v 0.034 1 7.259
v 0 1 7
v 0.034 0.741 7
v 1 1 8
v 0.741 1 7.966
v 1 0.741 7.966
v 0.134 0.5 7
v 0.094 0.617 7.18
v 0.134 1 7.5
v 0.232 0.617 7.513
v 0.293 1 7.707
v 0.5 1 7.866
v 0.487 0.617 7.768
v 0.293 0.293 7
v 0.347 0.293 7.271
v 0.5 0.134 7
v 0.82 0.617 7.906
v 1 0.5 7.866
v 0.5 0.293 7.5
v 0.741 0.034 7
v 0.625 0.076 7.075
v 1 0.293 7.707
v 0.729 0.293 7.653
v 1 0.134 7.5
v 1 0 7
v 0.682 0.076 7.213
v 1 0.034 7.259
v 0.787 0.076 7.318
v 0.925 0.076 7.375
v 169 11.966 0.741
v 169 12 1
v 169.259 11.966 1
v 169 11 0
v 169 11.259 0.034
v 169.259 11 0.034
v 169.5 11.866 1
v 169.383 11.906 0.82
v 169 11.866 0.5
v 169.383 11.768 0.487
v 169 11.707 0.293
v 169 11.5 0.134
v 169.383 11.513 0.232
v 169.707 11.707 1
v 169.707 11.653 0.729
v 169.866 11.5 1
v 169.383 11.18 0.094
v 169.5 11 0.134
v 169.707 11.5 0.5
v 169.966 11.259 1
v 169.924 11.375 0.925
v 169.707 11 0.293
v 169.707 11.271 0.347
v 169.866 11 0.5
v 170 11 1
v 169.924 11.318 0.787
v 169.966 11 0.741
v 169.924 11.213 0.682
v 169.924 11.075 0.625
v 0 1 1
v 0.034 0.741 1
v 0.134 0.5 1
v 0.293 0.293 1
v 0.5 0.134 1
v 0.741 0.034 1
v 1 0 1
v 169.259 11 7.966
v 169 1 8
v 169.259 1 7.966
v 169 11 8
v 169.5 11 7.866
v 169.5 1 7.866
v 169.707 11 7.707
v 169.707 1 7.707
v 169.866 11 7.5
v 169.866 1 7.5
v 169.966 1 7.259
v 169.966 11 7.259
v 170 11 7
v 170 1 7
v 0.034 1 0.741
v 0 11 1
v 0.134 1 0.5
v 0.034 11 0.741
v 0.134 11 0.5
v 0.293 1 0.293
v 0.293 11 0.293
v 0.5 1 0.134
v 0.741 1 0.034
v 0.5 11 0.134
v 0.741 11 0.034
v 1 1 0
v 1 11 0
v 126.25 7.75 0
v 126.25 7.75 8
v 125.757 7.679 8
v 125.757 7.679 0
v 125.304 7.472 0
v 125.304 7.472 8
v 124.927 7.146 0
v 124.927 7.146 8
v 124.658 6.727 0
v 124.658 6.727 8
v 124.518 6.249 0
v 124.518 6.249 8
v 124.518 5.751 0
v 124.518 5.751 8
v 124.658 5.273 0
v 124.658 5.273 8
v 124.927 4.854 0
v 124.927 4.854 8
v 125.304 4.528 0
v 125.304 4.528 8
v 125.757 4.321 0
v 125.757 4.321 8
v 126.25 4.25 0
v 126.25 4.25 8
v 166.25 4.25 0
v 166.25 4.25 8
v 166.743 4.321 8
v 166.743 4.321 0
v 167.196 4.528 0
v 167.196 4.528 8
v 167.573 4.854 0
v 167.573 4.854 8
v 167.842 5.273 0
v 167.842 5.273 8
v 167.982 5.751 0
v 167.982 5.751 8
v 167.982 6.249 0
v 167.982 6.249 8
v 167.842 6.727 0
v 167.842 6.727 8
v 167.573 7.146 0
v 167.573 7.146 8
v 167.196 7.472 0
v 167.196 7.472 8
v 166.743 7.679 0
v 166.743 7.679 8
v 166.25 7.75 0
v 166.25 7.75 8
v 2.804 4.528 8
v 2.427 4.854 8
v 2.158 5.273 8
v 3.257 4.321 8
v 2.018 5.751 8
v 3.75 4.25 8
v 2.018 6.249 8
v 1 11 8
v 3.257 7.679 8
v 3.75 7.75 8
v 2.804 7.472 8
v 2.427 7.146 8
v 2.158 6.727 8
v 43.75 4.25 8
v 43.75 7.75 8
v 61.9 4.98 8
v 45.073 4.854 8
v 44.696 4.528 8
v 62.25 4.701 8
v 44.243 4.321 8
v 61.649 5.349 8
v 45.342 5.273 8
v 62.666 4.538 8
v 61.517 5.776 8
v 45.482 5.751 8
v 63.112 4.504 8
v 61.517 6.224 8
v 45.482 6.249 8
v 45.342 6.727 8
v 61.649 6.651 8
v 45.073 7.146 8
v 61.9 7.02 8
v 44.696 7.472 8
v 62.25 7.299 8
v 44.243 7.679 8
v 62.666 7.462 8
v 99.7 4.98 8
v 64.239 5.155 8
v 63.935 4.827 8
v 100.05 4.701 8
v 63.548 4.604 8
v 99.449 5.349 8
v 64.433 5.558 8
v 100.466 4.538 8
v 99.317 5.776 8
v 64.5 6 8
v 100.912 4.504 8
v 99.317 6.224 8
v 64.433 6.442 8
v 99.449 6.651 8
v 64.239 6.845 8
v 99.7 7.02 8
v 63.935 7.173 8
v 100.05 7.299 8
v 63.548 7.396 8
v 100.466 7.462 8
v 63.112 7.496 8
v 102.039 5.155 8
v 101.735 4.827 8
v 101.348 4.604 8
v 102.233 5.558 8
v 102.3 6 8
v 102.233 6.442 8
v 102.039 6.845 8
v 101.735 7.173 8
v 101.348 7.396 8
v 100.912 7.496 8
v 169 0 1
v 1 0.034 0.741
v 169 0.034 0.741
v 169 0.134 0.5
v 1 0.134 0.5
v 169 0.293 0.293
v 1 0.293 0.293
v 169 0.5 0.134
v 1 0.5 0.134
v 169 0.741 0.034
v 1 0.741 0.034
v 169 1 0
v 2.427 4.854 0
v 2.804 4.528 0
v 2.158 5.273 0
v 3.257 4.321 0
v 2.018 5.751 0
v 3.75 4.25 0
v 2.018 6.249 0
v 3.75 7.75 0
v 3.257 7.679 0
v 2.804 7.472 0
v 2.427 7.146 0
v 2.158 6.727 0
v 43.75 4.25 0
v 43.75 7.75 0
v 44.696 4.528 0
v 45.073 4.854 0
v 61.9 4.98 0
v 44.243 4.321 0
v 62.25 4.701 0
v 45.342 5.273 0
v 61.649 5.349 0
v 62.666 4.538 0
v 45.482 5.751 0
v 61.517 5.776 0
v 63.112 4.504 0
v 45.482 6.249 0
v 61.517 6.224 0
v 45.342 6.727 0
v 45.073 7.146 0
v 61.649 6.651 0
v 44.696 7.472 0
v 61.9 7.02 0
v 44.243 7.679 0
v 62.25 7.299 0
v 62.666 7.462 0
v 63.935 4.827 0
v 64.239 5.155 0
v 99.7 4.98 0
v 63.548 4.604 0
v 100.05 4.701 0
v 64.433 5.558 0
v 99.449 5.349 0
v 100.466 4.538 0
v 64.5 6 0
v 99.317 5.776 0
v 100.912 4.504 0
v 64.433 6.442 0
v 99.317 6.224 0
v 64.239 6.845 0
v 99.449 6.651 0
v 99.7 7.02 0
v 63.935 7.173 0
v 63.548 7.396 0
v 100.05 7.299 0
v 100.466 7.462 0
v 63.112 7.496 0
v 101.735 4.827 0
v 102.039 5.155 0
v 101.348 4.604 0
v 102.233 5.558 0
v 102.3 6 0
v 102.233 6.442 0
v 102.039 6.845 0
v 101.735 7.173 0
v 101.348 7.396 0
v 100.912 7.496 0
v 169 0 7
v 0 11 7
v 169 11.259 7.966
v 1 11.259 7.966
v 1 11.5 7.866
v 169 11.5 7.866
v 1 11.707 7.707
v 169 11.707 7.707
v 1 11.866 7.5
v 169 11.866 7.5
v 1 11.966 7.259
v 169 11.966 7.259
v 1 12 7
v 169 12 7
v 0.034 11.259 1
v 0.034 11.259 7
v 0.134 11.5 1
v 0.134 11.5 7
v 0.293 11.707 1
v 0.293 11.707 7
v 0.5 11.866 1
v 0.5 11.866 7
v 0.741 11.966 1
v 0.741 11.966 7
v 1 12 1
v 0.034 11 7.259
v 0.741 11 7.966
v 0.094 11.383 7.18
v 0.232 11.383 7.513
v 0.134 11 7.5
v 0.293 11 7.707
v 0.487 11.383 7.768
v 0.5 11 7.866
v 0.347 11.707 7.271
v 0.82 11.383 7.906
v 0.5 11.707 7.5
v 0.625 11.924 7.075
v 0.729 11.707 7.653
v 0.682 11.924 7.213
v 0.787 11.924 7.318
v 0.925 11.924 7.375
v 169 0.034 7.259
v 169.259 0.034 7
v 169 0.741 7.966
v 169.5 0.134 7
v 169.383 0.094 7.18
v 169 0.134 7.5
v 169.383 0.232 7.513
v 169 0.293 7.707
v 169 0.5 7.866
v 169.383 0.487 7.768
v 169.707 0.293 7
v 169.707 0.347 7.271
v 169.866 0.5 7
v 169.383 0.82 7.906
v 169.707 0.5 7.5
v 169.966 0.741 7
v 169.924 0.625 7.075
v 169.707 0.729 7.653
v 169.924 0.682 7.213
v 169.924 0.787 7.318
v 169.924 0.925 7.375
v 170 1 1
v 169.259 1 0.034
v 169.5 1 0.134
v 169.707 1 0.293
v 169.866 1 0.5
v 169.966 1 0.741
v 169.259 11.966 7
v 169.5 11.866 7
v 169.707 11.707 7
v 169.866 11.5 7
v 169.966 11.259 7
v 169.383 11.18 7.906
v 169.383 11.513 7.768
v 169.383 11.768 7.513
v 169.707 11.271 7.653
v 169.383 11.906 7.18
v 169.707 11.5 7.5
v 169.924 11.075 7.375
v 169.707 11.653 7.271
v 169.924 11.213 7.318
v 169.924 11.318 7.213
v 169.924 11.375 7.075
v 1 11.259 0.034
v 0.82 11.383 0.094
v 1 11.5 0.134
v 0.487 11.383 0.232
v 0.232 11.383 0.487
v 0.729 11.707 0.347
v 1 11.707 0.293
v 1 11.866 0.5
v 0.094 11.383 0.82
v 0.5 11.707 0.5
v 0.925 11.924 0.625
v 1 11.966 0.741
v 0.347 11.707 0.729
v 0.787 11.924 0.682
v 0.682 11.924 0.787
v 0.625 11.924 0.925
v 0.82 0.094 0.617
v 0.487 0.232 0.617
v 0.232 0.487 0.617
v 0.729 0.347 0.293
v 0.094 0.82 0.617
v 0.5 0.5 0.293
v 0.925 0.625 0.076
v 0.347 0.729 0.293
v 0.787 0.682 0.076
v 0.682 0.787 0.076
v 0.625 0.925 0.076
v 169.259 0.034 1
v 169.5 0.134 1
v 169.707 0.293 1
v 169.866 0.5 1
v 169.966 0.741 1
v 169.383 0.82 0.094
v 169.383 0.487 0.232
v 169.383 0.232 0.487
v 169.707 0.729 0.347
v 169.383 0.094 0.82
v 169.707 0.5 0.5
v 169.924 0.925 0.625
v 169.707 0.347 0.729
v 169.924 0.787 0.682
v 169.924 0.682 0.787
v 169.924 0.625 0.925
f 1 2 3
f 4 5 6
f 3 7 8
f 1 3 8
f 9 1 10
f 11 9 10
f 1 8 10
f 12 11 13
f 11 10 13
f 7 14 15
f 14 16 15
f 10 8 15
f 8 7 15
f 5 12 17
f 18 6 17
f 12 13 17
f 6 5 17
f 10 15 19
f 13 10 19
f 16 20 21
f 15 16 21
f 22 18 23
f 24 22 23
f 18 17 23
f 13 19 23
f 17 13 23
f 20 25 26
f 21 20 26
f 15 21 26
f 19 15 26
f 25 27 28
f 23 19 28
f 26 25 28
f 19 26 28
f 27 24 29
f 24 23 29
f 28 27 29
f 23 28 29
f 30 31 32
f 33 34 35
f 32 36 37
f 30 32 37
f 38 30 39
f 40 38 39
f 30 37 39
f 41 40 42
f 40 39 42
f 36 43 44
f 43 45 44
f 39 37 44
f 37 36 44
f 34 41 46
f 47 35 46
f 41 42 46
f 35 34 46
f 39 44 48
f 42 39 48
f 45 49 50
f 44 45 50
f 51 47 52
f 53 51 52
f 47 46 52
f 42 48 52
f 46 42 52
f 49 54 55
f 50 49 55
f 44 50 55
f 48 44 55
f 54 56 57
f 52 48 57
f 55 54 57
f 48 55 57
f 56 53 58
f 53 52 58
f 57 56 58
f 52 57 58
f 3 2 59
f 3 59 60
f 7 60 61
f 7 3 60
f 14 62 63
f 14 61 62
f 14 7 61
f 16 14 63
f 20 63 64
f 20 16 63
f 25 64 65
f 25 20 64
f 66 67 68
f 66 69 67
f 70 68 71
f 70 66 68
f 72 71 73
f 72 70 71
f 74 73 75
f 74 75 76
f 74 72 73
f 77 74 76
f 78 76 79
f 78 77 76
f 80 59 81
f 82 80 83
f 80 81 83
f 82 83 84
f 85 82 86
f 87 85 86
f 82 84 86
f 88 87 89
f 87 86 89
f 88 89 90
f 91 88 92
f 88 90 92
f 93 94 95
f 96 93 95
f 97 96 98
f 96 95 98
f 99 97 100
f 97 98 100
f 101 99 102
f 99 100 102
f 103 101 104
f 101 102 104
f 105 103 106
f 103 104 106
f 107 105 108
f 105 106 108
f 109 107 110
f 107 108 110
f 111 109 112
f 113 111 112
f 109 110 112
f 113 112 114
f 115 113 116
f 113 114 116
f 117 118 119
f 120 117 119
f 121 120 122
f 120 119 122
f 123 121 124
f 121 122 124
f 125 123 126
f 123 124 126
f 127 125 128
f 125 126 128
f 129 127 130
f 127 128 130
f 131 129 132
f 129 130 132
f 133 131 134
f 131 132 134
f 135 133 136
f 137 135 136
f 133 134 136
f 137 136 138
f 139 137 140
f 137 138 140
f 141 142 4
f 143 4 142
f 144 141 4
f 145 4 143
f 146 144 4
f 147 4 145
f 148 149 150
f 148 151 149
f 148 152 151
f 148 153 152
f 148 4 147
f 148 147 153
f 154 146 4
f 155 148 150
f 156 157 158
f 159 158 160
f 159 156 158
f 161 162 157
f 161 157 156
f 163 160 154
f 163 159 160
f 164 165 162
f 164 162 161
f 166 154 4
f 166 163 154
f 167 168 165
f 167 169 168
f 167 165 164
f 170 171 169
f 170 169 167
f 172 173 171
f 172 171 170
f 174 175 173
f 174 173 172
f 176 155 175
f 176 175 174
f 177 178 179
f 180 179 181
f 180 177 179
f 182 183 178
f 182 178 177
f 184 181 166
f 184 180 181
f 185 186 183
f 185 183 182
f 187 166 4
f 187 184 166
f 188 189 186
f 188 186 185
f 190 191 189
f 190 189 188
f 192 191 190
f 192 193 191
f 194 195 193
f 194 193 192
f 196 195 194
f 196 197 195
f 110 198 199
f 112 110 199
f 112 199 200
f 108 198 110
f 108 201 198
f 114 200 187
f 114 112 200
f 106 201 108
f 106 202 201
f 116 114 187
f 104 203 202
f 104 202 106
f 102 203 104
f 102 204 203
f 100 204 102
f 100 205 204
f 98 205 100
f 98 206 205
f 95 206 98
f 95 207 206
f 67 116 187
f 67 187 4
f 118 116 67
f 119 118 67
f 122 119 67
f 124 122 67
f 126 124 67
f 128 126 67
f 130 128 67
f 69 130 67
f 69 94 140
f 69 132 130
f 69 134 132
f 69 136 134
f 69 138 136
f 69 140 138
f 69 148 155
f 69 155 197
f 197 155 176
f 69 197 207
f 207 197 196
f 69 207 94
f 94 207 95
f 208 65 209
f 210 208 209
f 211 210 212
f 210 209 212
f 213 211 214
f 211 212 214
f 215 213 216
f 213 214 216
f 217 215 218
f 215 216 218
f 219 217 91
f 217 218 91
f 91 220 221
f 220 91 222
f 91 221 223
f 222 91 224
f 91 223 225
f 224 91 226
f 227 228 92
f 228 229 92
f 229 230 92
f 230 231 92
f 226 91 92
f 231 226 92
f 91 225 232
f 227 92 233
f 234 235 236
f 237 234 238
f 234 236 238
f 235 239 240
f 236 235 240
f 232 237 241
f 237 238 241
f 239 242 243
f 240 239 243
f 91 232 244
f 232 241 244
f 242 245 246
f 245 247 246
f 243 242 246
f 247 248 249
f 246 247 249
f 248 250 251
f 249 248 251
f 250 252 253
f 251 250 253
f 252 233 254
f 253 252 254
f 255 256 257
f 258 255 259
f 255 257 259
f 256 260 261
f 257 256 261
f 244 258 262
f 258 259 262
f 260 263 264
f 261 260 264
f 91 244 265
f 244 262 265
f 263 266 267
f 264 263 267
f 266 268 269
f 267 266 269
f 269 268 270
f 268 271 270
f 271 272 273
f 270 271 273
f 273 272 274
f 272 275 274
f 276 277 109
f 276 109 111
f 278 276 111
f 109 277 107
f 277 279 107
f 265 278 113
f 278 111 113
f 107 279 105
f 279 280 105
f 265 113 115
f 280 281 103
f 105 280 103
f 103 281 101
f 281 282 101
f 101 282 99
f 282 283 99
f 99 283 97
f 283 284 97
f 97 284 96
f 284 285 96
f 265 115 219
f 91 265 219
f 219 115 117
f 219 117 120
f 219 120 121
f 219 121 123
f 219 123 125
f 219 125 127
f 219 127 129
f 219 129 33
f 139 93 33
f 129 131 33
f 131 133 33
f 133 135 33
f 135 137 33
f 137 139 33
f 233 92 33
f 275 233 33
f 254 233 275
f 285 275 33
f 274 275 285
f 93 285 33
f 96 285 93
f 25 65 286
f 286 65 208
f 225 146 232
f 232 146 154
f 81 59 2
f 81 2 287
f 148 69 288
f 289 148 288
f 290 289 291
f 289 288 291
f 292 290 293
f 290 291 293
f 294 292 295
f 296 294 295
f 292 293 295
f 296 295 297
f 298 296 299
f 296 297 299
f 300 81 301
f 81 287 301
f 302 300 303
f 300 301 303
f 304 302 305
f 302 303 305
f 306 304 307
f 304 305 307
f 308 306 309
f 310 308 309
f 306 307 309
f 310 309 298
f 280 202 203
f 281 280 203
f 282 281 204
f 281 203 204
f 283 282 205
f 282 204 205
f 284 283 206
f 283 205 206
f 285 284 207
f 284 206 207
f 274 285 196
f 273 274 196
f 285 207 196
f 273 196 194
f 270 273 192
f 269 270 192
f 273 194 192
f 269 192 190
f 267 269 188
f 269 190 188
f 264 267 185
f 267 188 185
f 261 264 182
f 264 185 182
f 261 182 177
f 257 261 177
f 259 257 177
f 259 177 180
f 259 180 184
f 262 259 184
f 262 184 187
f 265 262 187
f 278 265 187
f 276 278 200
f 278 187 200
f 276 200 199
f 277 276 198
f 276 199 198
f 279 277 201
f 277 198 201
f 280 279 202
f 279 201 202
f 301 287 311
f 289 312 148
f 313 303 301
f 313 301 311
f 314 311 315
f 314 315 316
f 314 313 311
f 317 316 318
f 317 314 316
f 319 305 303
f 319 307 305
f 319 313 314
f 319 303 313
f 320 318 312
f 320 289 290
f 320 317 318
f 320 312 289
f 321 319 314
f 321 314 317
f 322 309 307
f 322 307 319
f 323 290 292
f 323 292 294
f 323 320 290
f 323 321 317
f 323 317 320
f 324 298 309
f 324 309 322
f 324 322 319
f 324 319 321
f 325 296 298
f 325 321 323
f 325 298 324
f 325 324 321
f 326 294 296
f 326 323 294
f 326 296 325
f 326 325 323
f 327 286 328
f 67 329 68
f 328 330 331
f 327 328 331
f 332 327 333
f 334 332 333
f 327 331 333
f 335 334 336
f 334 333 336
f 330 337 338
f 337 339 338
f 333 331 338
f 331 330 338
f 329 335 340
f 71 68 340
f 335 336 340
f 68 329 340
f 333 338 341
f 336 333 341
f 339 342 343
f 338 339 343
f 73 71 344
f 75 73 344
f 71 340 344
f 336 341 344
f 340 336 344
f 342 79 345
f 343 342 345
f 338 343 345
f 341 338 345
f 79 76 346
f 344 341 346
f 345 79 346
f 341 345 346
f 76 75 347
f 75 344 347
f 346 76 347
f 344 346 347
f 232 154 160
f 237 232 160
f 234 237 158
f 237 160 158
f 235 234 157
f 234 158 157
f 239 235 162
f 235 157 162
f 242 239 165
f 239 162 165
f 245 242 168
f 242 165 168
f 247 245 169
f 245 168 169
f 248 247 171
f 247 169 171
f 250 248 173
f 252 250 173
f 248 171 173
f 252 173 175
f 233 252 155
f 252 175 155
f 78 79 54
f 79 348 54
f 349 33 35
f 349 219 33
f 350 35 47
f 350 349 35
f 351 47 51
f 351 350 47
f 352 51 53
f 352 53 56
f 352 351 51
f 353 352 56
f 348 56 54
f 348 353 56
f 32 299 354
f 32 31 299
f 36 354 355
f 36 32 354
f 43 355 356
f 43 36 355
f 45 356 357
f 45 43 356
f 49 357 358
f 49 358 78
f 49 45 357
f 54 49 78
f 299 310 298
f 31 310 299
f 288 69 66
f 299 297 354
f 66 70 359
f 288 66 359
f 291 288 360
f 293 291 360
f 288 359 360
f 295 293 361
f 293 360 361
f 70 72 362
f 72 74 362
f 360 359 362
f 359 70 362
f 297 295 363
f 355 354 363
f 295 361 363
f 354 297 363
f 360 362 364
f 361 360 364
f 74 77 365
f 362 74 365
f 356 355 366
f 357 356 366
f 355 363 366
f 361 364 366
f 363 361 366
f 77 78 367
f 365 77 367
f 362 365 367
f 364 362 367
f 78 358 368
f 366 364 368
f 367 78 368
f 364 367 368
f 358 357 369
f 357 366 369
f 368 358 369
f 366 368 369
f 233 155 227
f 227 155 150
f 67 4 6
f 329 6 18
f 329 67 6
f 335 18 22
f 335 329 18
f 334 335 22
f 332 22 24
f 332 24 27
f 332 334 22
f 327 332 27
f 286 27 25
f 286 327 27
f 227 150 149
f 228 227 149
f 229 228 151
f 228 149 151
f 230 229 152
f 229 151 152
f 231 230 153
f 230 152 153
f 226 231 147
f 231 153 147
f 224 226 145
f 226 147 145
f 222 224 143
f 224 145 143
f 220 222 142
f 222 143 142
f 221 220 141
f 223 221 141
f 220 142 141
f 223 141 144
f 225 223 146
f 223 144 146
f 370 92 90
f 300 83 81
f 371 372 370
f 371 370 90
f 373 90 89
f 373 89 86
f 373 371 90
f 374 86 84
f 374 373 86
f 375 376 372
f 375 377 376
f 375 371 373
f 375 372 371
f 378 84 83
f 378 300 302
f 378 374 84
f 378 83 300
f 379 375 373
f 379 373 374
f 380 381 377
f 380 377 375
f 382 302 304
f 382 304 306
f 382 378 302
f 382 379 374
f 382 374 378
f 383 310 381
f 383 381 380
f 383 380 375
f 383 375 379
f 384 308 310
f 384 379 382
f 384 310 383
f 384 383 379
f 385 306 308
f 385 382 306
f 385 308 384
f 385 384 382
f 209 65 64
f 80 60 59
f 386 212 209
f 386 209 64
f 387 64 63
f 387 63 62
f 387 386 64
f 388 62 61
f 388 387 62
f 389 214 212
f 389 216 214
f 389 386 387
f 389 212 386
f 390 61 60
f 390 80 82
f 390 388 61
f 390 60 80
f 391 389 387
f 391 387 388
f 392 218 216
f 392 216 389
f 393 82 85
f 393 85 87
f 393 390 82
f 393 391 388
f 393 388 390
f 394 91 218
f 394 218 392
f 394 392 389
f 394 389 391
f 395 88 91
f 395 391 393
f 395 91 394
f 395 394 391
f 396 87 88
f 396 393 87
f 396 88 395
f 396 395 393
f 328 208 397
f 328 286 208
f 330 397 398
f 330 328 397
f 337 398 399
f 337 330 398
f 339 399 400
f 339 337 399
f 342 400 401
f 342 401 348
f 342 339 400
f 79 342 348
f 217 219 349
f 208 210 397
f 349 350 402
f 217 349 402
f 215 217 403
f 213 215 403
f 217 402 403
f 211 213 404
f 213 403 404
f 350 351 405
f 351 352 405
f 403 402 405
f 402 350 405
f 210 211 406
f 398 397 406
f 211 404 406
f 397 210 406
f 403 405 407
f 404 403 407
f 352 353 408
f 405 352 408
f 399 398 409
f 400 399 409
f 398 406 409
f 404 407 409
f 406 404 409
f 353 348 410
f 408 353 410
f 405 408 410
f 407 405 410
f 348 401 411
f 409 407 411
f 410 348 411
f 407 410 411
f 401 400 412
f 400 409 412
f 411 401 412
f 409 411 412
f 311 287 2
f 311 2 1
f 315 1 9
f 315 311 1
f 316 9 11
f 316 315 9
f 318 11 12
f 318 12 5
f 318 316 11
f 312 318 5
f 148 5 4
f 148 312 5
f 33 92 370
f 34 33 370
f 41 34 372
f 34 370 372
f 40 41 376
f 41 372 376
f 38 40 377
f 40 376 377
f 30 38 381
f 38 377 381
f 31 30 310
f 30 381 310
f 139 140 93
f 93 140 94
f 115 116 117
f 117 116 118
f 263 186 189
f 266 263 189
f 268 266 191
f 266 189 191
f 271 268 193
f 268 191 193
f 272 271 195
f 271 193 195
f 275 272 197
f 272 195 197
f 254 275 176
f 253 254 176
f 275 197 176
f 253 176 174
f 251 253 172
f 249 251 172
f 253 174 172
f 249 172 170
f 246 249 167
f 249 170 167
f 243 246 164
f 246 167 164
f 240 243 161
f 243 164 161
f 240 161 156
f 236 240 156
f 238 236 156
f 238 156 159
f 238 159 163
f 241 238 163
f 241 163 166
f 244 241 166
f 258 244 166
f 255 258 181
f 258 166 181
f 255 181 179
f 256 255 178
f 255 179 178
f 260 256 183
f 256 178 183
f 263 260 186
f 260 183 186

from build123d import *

# Parameters (mm, degrees)
SKETCH_W        = 170
SKETCH_H        = 12
PAD_DEPTH       = 8
POCKET_DEPTH    = 8
POCKET001_DEPTH = 8
FILLET_R        = 1
FILLET001_R     = 1
FILLET002_R     = 1
FILLET003_R     = 1
FILLET004_R     = 1
SKETCH003_R     = 1.5
POCKET002_DEPTH = 8


with BuildPart() as part:
    # Sketch → Pad (new body)
    with BuildSketch(Plane.XY):
        with Locations((85, 6)):
            Rectangle(SKETCH_W, SKETCH_H)
    extrude(amount=PAD_DEPTH)

    # Sketch001 (on Face6 of Pad) → Pocket (cut)
    with BuildSketch(Plane.XY.offset(8)):
        with BuildLine():
            ThreePointArc((3.75, 7.75), (2, 6), (3.75, 4.25))
            Line((3.75, 4.25), (43.75, 4.25))
            ThreePointArc((43.75, 4.25), (45.5, 6), (43.75, 7.75))
            Line((43.75, 7.75), (3.75, 7.75))
        make_face()
    extrude(amount=-POCKET_DEPTH, mode=Mode.SUBTRACT)

    # Sketch002 (on Face5 of Pocket) → Pocket001 (cut)
    with BuildSketch(Plane.XY.offset(8)):
        with BuildLine():
            ThreePointArc((126.25, 7.75), (124.5, 6), (126.25, 4.25))
            Line((126.25, 4.25), (166.25, 4.25))
            ThreePointArc((166.25, 4.25), (168, 6), (166.25, 7.75))
            Line((166.25, 7.75), (126.25, 7.75))
        make_face()
    extrude(amount=-POCKET001_DEPTH, mode=Mode.SUBTRACT)

    # Fillet
    fillet_edges = [part.edges().sort_by_distance(p)[0] for p in [
        (0, 6, 8),
    ]]
    fillet(fillet_edges, radius=FILLET_R)

    # Fillet001
    fillet001_edges = [part.edges().sort_by_distance(p)[0] for p in [
        (0, 0, 3.5),
    ]]
    fillet(fillet001_edges, radius=FILLET001_R)

    # Fillet002
    fillet002_edges = [part.edges().sort_by_distance(p)[0] for p in [
        (0, 6.5, 0),
    ]]
    fillet(fillet002_edges, radius=FILLET002_R)

    # Fillet003
    fillet003_edges = [part.edges().sort_by_distance(p)[0] for p in [
        (0, 12, 4),
    ]]
    fillet(fillet003_edges, radius=FILLET003_R)

    # Fillet004
    fillet004_edges = [part.edges().sort_by_distance(p)[0] for p in [
        (170, 6, 8),
    ]]
    fillet(fillet004_edges, radius=FILLET004_R)

    # Sketch003 (on Face22 of Fillet004) → Pocket002 (cut)
    with BuildSketch(Plane.XY.offset(8)):
        with Locations((63, 6)):
            Circle(SKETCH003_R)
        with Locations((100.8, 6)):
            Circle(SKETCH003_R)
    extrude(amount=-POCKET002_DEPTH, mode=Mode.SUBTRACT)


solid = part.part
